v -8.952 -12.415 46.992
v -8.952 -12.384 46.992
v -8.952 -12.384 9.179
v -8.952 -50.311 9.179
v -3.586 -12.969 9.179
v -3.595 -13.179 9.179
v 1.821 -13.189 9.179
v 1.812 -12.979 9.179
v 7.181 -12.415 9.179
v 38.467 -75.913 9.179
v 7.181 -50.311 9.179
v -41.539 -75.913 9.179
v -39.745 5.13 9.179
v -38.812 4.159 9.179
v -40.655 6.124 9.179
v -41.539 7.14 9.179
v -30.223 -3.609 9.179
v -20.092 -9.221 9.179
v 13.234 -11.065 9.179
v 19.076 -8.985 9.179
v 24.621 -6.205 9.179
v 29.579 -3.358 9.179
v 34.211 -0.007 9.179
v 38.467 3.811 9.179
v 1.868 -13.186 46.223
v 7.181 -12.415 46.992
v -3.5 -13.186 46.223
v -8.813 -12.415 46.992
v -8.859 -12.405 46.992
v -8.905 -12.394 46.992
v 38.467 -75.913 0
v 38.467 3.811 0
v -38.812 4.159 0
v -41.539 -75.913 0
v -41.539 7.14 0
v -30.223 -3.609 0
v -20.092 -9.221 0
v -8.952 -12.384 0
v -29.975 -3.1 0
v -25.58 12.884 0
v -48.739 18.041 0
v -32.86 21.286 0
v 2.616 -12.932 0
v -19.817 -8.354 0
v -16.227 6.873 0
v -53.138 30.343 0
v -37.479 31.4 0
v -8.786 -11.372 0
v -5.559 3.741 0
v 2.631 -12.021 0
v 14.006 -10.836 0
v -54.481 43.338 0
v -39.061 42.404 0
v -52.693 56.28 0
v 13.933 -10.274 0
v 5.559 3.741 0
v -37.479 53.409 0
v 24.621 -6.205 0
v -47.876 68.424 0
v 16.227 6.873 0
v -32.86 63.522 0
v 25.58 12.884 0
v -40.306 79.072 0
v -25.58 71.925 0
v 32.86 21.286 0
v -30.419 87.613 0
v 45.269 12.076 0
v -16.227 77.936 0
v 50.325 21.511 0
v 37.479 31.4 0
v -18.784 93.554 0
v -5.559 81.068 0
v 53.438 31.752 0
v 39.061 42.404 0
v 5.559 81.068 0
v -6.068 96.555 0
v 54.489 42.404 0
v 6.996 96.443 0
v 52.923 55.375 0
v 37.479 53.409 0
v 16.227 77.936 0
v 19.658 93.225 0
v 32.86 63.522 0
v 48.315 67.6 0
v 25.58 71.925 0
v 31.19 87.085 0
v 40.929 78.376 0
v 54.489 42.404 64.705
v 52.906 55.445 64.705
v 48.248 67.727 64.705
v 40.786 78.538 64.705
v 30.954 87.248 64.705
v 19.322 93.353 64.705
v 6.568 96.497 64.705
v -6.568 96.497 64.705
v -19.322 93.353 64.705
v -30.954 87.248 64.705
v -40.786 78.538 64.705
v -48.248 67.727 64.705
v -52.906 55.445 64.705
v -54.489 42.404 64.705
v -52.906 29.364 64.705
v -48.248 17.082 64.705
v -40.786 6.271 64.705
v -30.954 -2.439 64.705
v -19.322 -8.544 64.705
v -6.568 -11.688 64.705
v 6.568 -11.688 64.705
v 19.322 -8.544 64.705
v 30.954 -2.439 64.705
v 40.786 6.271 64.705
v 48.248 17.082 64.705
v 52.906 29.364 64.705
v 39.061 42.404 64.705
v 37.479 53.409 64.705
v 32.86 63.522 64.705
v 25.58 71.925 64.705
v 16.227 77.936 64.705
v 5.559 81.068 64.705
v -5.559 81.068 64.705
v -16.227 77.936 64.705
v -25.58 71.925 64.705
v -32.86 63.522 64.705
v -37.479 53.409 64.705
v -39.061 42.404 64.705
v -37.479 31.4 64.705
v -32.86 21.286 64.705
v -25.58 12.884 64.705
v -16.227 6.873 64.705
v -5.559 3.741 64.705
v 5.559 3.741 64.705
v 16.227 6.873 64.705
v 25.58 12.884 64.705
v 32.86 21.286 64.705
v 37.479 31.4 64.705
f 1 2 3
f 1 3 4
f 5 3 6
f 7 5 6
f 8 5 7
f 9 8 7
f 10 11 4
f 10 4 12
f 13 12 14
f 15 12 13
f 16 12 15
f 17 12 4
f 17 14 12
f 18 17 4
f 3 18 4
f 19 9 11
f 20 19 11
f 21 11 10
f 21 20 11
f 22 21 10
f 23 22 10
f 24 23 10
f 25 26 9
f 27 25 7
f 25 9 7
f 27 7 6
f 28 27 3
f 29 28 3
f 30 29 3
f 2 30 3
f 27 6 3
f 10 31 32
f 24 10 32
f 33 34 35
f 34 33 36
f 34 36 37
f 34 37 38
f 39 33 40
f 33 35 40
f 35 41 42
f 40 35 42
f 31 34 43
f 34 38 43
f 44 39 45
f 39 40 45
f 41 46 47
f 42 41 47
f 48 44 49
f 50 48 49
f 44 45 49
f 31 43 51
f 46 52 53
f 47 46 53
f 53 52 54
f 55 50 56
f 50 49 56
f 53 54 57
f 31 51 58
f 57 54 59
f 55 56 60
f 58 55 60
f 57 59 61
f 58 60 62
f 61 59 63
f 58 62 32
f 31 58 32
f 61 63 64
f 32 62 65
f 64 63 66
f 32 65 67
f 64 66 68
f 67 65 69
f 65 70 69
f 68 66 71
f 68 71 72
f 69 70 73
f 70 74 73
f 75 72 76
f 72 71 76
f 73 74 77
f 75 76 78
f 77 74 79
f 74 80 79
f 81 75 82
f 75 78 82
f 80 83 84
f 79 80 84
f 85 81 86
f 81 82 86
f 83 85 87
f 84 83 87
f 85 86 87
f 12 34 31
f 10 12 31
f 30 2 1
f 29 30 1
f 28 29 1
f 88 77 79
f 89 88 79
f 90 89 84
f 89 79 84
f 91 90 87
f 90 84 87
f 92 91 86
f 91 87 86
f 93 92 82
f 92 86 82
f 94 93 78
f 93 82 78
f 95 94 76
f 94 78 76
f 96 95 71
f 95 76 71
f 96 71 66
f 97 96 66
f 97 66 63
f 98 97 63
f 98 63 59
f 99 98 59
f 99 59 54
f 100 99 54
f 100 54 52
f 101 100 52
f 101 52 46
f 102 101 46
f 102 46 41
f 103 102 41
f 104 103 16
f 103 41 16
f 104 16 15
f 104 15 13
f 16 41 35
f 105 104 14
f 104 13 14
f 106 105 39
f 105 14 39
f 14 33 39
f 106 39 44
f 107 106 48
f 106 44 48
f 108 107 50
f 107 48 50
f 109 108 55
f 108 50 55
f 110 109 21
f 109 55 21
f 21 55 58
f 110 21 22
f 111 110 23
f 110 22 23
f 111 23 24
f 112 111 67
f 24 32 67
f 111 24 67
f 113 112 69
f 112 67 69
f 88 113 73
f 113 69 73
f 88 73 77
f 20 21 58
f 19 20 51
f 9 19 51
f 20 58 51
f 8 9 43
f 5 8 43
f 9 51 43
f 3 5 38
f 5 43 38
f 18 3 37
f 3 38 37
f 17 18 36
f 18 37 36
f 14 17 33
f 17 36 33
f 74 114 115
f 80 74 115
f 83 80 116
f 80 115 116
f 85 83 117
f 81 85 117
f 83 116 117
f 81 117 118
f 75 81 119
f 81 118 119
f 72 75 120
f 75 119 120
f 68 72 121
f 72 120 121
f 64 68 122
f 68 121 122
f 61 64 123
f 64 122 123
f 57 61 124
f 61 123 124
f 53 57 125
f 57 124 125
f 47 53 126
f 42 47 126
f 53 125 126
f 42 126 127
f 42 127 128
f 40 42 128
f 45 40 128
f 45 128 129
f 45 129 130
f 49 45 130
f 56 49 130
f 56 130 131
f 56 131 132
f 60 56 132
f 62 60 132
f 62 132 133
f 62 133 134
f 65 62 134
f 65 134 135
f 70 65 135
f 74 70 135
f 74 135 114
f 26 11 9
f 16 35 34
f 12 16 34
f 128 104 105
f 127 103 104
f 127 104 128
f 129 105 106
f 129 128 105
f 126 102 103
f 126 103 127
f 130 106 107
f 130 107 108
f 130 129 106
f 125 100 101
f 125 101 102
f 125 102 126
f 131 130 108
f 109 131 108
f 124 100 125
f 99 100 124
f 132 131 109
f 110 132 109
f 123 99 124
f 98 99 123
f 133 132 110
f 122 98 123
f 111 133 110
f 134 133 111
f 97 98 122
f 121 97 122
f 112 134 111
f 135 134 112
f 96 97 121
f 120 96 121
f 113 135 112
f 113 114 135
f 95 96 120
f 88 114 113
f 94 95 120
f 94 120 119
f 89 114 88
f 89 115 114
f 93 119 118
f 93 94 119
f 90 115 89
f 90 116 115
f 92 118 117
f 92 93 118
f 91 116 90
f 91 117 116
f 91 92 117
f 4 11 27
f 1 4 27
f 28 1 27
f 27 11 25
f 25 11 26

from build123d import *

# Parameters (mm, degrees)
F0_R     = 54.489466
F1_DEPTH = 64.704746
F2_R     = 39.061094
F3_DEPTH = 64.705746
F5_DEPTH = 9.179119
F7_DEPTH = 37.812758
F9_DEPTH = 61.671157


with BuildPart() as f1:
    # F0 (on Top) → F1 (new body)
    with BuildSketch(Plane.XY):
        with Locations((0, 42.404458)):
            Circle(F0_R)
    extrude(amount=F1_DEPTH)

    # F2 (on face) → F3 (cut, through all)
    with BuildSketch(Plane.XY.offset(64.704746)):
        with Locations((0, 42.404458)):
            Circle(F2_R)
    extrude(amount=-F3_DEPTH, mode=Mode.SUBTRACT)

    # F4 (on Top) → F5 (join)
    with BuildSketch(Plane.XY):
        with BuildLine():
            ThreePointArc((38.466547, 5.618665), (-2.008565, -13.031675), (-41.539069, 7.545232))
            Line((-41.539069, 7.545232), (-41.539069, -75.912714))
            Line((-41.539069, -75.912714), (38.466547, -75.912714))
            Line((38.466547, -75.912714), (38.466547, 5.618665))
        make_face()
    extrude(amount=F5_DEPTH)

    # F6 (on face) → F7 (join)
    with BuildSketch(Plane.XY.offset(9.179119)):
        with BuildLine():
            ThreePointArc((7.180691, -12.414793), (-0.887242, -13.282551), (-8.9518, -12.38397))
            Line((-8.9518, -12.38397), (-8.9518, -50.31085))
            Line((-8.9518, -50.31085), (7.180691, -50.31085))
            Line((7.180691, -50.31085), (7.180691, -12.414793))
        make_face()
    extrude(amount=F7_DEPTH)

    # F8 (on face) → F9 (cut, through all)
    with BuildSketch(Plane.YZ.offset(7.180691)):
        Polygon((-50.31085, 9.179119), (-12.414793, 46.991877), (-50.31085, 46.991877), align=None)
    extrude(amount=-F9_DEPTH, mode=Mode.SUBTRACT)


solid = f1.part
